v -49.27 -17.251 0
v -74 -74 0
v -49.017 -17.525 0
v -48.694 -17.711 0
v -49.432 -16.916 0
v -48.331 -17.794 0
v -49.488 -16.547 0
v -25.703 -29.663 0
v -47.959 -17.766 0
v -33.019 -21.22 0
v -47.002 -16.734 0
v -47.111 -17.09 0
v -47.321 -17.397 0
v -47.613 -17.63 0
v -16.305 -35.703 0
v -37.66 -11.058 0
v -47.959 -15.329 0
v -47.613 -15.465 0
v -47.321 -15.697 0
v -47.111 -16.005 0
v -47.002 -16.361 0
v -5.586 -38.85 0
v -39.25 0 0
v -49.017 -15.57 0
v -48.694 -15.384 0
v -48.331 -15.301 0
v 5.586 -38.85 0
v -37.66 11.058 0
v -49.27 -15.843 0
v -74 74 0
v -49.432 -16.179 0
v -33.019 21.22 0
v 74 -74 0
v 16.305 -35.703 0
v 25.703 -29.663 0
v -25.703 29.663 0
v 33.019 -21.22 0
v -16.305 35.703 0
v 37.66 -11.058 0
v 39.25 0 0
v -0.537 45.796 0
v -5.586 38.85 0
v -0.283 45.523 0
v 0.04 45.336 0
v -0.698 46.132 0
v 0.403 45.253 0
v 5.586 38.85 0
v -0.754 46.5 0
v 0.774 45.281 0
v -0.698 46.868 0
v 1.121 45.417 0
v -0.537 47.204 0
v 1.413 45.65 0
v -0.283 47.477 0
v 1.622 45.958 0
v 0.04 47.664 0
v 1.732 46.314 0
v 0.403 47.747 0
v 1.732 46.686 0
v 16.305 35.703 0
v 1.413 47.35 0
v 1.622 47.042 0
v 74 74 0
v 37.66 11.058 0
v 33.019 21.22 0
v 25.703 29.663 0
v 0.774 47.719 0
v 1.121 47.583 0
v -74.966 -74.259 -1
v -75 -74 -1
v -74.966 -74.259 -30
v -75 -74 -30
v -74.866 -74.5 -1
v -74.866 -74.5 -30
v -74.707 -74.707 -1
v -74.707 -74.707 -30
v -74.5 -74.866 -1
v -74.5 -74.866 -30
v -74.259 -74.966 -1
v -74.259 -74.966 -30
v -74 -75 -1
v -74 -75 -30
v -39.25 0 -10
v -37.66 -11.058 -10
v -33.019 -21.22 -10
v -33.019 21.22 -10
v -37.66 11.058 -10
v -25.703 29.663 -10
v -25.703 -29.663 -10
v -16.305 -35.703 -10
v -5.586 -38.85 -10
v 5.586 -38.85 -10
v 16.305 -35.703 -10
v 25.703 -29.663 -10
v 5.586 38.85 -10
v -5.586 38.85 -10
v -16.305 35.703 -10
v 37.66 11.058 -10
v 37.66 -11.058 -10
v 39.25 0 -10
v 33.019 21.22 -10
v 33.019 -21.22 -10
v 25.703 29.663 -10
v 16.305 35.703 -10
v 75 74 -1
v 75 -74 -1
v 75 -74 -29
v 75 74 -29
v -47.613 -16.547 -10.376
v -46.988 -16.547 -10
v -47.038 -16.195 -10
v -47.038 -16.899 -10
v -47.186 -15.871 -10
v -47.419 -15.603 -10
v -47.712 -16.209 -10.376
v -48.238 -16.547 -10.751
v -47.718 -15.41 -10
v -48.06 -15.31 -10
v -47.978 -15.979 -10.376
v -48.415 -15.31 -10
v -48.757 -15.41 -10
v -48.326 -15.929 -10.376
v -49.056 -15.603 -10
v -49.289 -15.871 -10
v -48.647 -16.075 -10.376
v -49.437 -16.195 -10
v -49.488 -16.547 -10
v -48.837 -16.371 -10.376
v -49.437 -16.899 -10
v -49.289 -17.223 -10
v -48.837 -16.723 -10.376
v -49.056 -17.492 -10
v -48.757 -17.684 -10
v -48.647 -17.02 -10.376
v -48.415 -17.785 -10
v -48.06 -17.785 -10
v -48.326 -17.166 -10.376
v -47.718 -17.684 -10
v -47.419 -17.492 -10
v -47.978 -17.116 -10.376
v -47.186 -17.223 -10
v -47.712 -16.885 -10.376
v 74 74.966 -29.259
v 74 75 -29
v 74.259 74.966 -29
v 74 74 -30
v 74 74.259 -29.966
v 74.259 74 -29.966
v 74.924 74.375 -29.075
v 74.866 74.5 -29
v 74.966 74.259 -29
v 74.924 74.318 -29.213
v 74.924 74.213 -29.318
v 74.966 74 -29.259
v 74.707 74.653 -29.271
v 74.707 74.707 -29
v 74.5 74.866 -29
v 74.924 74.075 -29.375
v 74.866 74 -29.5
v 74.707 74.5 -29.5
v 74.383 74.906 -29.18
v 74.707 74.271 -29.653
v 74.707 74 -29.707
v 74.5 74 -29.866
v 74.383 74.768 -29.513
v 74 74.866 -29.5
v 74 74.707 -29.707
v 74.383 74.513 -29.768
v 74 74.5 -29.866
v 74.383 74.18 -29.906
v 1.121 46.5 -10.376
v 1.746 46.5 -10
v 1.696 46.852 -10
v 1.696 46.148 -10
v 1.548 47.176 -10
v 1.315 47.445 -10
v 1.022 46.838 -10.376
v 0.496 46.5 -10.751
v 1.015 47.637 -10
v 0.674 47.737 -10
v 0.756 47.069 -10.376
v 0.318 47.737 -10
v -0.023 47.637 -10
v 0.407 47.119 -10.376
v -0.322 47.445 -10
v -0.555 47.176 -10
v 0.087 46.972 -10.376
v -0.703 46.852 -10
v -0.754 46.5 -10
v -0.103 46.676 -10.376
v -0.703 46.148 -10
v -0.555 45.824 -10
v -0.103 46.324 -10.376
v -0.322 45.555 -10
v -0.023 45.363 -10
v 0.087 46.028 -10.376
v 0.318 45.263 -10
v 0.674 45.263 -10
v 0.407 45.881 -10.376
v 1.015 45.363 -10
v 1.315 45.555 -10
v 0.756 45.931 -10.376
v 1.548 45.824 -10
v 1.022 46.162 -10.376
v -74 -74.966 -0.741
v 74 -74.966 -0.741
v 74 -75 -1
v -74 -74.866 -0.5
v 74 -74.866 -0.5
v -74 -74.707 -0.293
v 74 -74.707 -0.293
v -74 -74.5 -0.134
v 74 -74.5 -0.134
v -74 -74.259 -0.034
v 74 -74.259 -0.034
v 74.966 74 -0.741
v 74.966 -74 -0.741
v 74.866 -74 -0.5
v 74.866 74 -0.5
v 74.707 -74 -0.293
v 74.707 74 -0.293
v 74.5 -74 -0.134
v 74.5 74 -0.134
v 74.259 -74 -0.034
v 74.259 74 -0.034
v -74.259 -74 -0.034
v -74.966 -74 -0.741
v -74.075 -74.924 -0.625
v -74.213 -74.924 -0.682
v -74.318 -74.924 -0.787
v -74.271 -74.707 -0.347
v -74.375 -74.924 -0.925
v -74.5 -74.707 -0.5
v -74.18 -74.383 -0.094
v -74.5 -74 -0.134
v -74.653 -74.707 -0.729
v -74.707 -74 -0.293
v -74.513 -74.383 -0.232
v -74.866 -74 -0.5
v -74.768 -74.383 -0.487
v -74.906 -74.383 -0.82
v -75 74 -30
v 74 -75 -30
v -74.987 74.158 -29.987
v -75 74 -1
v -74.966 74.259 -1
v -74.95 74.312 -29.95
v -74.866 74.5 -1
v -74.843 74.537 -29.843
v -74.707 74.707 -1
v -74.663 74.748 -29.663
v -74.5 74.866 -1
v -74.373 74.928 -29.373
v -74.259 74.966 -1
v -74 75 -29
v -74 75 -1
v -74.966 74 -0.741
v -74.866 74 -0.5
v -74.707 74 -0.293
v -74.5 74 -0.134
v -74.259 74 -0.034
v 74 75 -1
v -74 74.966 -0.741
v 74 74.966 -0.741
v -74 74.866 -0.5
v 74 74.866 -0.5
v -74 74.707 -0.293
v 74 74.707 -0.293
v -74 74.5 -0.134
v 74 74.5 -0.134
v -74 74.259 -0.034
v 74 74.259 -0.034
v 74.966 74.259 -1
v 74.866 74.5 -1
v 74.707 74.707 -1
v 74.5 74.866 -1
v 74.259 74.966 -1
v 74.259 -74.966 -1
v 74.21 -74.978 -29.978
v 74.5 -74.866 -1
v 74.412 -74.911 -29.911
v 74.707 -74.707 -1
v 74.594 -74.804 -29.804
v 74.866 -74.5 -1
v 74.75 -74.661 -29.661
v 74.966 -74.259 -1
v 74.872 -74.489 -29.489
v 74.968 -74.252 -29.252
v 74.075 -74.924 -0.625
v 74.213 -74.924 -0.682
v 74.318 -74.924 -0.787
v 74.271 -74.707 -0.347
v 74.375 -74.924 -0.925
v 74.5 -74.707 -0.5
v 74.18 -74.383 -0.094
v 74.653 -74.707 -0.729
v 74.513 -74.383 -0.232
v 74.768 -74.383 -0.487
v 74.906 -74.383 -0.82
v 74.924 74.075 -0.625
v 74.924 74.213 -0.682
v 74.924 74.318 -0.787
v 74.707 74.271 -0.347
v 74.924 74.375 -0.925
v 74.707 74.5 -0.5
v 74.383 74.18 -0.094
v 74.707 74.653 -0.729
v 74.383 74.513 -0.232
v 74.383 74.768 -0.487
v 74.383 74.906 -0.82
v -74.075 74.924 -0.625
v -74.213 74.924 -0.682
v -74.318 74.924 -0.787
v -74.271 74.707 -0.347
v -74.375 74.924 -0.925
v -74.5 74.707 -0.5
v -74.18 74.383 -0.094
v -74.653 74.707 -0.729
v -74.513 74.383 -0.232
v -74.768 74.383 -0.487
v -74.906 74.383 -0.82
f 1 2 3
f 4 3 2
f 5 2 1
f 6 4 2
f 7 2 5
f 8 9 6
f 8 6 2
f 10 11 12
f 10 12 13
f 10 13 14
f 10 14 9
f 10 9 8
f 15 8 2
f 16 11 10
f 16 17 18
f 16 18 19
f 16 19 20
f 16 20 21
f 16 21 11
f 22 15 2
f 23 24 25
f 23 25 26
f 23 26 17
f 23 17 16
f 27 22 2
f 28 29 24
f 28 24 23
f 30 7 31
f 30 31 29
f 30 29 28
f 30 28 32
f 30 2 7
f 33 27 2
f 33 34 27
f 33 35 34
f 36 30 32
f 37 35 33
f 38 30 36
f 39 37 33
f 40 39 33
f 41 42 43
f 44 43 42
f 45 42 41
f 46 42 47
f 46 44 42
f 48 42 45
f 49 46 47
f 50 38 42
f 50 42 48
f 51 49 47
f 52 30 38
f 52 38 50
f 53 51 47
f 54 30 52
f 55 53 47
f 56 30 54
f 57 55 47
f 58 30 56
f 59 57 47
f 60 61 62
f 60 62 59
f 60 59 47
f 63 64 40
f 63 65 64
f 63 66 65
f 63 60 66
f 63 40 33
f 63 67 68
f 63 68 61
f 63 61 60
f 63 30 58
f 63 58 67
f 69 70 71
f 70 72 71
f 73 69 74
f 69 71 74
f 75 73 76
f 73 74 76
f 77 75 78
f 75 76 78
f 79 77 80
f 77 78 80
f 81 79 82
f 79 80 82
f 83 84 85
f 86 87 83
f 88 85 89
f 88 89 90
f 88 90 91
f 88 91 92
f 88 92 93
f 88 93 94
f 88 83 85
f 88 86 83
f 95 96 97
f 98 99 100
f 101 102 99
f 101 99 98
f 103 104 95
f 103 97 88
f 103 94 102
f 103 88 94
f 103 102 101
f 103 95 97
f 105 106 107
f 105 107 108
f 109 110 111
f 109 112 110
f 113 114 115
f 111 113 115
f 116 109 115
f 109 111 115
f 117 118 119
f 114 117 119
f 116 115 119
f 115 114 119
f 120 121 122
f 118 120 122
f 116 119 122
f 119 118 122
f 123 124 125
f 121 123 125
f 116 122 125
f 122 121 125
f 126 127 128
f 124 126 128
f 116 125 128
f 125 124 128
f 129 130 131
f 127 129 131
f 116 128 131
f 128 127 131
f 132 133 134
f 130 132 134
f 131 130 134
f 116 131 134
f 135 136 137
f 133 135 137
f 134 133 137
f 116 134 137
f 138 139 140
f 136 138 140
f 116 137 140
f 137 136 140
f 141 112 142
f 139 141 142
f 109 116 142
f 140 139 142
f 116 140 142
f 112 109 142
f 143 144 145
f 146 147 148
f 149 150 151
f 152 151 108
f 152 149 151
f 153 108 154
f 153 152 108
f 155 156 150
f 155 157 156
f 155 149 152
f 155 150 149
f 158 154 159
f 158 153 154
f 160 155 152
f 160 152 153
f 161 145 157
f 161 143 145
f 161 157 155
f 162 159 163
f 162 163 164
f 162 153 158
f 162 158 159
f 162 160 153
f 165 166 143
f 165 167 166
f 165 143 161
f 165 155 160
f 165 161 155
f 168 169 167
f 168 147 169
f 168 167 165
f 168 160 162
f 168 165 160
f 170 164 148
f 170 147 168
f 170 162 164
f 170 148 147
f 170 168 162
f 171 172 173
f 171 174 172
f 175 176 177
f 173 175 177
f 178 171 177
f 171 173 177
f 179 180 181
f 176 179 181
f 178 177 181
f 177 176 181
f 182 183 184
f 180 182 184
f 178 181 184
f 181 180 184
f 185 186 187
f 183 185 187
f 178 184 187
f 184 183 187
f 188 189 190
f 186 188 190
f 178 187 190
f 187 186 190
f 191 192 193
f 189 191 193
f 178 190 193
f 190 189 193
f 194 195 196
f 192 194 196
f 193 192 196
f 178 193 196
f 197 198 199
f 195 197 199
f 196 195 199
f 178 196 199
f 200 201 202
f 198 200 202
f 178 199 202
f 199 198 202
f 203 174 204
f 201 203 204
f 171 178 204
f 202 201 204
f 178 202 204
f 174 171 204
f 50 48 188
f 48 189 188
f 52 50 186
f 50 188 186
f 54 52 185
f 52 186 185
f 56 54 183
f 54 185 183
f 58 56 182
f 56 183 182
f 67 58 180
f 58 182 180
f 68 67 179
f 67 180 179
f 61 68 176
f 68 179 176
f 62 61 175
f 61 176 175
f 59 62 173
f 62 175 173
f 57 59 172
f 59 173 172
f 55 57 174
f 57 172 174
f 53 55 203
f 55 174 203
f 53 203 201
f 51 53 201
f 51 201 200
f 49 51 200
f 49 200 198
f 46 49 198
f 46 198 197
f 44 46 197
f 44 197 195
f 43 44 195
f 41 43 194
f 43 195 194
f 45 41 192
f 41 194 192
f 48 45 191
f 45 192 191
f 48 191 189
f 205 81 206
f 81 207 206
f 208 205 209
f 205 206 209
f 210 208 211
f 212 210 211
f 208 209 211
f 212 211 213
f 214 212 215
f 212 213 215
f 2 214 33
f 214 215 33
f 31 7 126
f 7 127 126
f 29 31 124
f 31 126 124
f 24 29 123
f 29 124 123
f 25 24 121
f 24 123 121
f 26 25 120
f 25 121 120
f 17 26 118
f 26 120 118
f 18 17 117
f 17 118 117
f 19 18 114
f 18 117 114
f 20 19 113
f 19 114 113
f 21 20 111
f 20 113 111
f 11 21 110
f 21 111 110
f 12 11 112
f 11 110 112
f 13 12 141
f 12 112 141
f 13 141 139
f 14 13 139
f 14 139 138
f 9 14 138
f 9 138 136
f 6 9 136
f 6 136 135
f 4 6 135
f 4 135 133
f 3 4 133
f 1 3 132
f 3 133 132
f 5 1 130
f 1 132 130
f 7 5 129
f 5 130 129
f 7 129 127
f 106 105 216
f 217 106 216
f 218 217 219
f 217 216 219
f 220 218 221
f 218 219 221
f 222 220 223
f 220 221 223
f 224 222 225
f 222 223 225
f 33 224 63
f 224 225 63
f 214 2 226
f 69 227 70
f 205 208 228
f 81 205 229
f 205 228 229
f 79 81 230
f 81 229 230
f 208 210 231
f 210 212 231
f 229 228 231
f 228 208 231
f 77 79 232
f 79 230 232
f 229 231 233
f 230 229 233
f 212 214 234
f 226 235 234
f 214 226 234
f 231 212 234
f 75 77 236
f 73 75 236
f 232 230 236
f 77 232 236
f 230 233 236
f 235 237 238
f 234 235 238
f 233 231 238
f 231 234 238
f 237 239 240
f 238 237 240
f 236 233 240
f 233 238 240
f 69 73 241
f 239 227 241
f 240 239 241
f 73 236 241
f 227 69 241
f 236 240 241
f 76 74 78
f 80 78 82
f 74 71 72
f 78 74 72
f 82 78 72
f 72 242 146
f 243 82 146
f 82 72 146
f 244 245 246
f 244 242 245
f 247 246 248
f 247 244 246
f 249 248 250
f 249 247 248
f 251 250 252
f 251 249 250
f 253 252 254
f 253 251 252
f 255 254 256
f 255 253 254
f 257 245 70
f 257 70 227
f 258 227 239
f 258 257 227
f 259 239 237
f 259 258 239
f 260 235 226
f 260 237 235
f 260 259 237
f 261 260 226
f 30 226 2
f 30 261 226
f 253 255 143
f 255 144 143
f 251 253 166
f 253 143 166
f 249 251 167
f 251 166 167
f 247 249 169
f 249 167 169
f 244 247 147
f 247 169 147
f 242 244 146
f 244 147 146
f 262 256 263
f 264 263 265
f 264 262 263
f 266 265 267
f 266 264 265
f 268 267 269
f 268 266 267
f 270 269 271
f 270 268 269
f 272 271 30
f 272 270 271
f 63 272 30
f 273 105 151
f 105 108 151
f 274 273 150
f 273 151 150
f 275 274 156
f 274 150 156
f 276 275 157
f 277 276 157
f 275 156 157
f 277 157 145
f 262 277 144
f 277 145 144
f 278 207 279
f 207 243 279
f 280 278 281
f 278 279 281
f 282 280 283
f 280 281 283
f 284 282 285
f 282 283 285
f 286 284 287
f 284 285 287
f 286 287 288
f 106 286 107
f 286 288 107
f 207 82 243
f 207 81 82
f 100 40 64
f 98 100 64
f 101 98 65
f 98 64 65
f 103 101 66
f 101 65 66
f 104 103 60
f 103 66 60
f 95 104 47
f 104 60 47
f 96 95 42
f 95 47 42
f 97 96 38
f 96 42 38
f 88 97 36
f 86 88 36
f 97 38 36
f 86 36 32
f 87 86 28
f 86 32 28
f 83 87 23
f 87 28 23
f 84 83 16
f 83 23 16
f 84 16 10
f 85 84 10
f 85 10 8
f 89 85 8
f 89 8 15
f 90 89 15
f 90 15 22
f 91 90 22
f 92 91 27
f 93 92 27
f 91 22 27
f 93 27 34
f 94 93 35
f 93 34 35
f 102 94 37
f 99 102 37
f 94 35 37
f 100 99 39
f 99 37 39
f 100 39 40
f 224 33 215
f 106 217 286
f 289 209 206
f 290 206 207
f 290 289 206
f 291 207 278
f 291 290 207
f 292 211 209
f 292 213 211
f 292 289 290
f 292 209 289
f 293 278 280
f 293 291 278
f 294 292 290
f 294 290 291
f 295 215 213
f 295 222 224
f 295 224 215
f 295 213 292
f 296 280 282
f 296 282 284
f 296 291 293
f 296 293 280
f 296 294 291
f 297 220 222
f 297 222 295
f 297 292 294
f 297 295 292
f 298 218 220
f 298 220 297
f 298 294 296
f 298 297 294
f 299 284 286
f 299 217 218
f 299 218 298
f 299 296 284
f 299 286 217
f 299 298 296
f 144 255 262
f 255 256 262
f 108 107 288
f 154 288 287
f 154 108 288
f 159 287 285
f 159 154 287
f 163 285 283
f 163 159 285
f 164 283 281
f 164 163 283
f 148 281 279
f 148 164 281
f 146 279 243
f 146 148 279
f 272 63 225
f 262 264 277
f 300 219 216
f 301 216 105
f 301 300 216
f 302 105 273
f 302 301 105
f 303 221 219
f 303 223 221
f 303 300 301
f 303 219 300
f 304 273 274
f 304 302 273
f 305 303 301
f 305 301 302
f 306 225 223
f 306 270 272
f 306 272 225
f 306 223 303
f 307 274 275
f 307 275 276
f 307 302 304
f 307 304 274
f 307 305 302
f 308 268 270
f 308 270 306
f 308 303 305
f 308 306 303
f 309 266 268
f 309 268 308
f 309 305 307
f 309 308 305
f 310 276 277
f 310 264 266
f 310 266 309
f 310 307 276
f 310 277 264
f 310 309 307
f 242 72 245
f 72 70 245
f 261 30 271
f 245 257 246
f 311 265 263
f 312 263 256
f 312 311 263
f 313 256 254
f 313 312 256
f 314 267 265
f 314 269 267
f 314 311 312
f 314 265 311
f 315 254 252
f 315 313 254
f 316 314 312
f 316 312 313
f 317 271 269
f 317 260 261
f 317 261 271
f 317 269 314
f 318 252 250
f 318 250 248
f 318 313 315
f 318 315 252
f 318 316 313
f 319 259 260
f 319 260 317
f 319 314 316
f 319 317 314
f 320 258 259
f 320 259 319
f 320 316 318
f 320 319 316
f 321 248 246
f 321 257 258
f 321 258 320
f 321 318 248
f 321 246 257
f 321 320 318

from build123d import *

# Parameters (mm, degrees)
SKETCH1_W                       = 150
SKETCH1_H                       = 150
BOSS_EXTRUDE1_DEPTH             = 30
FILLET1_R                       = 1
SKETCH2_R                       = 39.25
CUT_EXTRUDE4_DEPTH              = 10
TAP_DRILL_FOR_M3X0_5_TAP3_D     = 2.5
TAP_DRILL_FOR_M3X0_5_TAP3_DEPTH = 10
TAP_DRILL_FOR_M3X0_5_TAP3_TIP   = 0.751075774


with BuildPart() as part:
    # Sketch1 → Boss-Extrude1 (new body)
    with BuildSketch(Plane.XY):
        Rectangle(SKETCH1_W, SKETCH1_H)
    extrude(amount=-BOSS_EXTRUDE1_DEPTH)

    # Fillet1
    fillet1_edges = [part.edges().sort_by_distance(p)[0] for p in [
        (0, 75, -30),
        (-75, 0, 0),
        (0, 75, 0),
        (75, 0, 0),
        (0, -75, 0),
        (-75, -75, -15),
        (-75, 75, -15),
        (75, 75, -15),
        (75, -75, -15),
        (75, 0, -30),
    ]]
    fillet(fillet1_edges, radius=FILLET1_R)

    # Sketch2 → Cut-Extrude4 (cut)
    with BuildSketch(Plane.XY):
        Circle(SKETCH2_R)
    extrude(amount=-CUT_EXTRUDE4_DEPTH, mode=Mode.SUBTRACT)

    # Tap Drill for M3x0.5 Tap3
    with Locations(Plane.XY):
        with Locations((0.496213053, 46.5), (-48.237547134, -16.547252974)):
            Hole(TAP_DRILL_FOR_M3X0_5_TAP3_D / 2, depth=TAP_DRILL_FOR_M3X0_5_TAP3_DEPTH)
            with Locations((0, 0, -(TAP_DRILL_FOR_M3X0_5_TAP3_DEPTH + TAP_DRILL_FOR_M3X0_5_TAP3_TIP / 2))):  # 118° drill point
                Cone(0, TAP_DRILL_FOR_M3X0_5_TAP3_D / 2, TAP_DRILL_FOR_M3X0_5_TAP3_TIP, mode=Mode.SUBTRACT)


solid = part.part
